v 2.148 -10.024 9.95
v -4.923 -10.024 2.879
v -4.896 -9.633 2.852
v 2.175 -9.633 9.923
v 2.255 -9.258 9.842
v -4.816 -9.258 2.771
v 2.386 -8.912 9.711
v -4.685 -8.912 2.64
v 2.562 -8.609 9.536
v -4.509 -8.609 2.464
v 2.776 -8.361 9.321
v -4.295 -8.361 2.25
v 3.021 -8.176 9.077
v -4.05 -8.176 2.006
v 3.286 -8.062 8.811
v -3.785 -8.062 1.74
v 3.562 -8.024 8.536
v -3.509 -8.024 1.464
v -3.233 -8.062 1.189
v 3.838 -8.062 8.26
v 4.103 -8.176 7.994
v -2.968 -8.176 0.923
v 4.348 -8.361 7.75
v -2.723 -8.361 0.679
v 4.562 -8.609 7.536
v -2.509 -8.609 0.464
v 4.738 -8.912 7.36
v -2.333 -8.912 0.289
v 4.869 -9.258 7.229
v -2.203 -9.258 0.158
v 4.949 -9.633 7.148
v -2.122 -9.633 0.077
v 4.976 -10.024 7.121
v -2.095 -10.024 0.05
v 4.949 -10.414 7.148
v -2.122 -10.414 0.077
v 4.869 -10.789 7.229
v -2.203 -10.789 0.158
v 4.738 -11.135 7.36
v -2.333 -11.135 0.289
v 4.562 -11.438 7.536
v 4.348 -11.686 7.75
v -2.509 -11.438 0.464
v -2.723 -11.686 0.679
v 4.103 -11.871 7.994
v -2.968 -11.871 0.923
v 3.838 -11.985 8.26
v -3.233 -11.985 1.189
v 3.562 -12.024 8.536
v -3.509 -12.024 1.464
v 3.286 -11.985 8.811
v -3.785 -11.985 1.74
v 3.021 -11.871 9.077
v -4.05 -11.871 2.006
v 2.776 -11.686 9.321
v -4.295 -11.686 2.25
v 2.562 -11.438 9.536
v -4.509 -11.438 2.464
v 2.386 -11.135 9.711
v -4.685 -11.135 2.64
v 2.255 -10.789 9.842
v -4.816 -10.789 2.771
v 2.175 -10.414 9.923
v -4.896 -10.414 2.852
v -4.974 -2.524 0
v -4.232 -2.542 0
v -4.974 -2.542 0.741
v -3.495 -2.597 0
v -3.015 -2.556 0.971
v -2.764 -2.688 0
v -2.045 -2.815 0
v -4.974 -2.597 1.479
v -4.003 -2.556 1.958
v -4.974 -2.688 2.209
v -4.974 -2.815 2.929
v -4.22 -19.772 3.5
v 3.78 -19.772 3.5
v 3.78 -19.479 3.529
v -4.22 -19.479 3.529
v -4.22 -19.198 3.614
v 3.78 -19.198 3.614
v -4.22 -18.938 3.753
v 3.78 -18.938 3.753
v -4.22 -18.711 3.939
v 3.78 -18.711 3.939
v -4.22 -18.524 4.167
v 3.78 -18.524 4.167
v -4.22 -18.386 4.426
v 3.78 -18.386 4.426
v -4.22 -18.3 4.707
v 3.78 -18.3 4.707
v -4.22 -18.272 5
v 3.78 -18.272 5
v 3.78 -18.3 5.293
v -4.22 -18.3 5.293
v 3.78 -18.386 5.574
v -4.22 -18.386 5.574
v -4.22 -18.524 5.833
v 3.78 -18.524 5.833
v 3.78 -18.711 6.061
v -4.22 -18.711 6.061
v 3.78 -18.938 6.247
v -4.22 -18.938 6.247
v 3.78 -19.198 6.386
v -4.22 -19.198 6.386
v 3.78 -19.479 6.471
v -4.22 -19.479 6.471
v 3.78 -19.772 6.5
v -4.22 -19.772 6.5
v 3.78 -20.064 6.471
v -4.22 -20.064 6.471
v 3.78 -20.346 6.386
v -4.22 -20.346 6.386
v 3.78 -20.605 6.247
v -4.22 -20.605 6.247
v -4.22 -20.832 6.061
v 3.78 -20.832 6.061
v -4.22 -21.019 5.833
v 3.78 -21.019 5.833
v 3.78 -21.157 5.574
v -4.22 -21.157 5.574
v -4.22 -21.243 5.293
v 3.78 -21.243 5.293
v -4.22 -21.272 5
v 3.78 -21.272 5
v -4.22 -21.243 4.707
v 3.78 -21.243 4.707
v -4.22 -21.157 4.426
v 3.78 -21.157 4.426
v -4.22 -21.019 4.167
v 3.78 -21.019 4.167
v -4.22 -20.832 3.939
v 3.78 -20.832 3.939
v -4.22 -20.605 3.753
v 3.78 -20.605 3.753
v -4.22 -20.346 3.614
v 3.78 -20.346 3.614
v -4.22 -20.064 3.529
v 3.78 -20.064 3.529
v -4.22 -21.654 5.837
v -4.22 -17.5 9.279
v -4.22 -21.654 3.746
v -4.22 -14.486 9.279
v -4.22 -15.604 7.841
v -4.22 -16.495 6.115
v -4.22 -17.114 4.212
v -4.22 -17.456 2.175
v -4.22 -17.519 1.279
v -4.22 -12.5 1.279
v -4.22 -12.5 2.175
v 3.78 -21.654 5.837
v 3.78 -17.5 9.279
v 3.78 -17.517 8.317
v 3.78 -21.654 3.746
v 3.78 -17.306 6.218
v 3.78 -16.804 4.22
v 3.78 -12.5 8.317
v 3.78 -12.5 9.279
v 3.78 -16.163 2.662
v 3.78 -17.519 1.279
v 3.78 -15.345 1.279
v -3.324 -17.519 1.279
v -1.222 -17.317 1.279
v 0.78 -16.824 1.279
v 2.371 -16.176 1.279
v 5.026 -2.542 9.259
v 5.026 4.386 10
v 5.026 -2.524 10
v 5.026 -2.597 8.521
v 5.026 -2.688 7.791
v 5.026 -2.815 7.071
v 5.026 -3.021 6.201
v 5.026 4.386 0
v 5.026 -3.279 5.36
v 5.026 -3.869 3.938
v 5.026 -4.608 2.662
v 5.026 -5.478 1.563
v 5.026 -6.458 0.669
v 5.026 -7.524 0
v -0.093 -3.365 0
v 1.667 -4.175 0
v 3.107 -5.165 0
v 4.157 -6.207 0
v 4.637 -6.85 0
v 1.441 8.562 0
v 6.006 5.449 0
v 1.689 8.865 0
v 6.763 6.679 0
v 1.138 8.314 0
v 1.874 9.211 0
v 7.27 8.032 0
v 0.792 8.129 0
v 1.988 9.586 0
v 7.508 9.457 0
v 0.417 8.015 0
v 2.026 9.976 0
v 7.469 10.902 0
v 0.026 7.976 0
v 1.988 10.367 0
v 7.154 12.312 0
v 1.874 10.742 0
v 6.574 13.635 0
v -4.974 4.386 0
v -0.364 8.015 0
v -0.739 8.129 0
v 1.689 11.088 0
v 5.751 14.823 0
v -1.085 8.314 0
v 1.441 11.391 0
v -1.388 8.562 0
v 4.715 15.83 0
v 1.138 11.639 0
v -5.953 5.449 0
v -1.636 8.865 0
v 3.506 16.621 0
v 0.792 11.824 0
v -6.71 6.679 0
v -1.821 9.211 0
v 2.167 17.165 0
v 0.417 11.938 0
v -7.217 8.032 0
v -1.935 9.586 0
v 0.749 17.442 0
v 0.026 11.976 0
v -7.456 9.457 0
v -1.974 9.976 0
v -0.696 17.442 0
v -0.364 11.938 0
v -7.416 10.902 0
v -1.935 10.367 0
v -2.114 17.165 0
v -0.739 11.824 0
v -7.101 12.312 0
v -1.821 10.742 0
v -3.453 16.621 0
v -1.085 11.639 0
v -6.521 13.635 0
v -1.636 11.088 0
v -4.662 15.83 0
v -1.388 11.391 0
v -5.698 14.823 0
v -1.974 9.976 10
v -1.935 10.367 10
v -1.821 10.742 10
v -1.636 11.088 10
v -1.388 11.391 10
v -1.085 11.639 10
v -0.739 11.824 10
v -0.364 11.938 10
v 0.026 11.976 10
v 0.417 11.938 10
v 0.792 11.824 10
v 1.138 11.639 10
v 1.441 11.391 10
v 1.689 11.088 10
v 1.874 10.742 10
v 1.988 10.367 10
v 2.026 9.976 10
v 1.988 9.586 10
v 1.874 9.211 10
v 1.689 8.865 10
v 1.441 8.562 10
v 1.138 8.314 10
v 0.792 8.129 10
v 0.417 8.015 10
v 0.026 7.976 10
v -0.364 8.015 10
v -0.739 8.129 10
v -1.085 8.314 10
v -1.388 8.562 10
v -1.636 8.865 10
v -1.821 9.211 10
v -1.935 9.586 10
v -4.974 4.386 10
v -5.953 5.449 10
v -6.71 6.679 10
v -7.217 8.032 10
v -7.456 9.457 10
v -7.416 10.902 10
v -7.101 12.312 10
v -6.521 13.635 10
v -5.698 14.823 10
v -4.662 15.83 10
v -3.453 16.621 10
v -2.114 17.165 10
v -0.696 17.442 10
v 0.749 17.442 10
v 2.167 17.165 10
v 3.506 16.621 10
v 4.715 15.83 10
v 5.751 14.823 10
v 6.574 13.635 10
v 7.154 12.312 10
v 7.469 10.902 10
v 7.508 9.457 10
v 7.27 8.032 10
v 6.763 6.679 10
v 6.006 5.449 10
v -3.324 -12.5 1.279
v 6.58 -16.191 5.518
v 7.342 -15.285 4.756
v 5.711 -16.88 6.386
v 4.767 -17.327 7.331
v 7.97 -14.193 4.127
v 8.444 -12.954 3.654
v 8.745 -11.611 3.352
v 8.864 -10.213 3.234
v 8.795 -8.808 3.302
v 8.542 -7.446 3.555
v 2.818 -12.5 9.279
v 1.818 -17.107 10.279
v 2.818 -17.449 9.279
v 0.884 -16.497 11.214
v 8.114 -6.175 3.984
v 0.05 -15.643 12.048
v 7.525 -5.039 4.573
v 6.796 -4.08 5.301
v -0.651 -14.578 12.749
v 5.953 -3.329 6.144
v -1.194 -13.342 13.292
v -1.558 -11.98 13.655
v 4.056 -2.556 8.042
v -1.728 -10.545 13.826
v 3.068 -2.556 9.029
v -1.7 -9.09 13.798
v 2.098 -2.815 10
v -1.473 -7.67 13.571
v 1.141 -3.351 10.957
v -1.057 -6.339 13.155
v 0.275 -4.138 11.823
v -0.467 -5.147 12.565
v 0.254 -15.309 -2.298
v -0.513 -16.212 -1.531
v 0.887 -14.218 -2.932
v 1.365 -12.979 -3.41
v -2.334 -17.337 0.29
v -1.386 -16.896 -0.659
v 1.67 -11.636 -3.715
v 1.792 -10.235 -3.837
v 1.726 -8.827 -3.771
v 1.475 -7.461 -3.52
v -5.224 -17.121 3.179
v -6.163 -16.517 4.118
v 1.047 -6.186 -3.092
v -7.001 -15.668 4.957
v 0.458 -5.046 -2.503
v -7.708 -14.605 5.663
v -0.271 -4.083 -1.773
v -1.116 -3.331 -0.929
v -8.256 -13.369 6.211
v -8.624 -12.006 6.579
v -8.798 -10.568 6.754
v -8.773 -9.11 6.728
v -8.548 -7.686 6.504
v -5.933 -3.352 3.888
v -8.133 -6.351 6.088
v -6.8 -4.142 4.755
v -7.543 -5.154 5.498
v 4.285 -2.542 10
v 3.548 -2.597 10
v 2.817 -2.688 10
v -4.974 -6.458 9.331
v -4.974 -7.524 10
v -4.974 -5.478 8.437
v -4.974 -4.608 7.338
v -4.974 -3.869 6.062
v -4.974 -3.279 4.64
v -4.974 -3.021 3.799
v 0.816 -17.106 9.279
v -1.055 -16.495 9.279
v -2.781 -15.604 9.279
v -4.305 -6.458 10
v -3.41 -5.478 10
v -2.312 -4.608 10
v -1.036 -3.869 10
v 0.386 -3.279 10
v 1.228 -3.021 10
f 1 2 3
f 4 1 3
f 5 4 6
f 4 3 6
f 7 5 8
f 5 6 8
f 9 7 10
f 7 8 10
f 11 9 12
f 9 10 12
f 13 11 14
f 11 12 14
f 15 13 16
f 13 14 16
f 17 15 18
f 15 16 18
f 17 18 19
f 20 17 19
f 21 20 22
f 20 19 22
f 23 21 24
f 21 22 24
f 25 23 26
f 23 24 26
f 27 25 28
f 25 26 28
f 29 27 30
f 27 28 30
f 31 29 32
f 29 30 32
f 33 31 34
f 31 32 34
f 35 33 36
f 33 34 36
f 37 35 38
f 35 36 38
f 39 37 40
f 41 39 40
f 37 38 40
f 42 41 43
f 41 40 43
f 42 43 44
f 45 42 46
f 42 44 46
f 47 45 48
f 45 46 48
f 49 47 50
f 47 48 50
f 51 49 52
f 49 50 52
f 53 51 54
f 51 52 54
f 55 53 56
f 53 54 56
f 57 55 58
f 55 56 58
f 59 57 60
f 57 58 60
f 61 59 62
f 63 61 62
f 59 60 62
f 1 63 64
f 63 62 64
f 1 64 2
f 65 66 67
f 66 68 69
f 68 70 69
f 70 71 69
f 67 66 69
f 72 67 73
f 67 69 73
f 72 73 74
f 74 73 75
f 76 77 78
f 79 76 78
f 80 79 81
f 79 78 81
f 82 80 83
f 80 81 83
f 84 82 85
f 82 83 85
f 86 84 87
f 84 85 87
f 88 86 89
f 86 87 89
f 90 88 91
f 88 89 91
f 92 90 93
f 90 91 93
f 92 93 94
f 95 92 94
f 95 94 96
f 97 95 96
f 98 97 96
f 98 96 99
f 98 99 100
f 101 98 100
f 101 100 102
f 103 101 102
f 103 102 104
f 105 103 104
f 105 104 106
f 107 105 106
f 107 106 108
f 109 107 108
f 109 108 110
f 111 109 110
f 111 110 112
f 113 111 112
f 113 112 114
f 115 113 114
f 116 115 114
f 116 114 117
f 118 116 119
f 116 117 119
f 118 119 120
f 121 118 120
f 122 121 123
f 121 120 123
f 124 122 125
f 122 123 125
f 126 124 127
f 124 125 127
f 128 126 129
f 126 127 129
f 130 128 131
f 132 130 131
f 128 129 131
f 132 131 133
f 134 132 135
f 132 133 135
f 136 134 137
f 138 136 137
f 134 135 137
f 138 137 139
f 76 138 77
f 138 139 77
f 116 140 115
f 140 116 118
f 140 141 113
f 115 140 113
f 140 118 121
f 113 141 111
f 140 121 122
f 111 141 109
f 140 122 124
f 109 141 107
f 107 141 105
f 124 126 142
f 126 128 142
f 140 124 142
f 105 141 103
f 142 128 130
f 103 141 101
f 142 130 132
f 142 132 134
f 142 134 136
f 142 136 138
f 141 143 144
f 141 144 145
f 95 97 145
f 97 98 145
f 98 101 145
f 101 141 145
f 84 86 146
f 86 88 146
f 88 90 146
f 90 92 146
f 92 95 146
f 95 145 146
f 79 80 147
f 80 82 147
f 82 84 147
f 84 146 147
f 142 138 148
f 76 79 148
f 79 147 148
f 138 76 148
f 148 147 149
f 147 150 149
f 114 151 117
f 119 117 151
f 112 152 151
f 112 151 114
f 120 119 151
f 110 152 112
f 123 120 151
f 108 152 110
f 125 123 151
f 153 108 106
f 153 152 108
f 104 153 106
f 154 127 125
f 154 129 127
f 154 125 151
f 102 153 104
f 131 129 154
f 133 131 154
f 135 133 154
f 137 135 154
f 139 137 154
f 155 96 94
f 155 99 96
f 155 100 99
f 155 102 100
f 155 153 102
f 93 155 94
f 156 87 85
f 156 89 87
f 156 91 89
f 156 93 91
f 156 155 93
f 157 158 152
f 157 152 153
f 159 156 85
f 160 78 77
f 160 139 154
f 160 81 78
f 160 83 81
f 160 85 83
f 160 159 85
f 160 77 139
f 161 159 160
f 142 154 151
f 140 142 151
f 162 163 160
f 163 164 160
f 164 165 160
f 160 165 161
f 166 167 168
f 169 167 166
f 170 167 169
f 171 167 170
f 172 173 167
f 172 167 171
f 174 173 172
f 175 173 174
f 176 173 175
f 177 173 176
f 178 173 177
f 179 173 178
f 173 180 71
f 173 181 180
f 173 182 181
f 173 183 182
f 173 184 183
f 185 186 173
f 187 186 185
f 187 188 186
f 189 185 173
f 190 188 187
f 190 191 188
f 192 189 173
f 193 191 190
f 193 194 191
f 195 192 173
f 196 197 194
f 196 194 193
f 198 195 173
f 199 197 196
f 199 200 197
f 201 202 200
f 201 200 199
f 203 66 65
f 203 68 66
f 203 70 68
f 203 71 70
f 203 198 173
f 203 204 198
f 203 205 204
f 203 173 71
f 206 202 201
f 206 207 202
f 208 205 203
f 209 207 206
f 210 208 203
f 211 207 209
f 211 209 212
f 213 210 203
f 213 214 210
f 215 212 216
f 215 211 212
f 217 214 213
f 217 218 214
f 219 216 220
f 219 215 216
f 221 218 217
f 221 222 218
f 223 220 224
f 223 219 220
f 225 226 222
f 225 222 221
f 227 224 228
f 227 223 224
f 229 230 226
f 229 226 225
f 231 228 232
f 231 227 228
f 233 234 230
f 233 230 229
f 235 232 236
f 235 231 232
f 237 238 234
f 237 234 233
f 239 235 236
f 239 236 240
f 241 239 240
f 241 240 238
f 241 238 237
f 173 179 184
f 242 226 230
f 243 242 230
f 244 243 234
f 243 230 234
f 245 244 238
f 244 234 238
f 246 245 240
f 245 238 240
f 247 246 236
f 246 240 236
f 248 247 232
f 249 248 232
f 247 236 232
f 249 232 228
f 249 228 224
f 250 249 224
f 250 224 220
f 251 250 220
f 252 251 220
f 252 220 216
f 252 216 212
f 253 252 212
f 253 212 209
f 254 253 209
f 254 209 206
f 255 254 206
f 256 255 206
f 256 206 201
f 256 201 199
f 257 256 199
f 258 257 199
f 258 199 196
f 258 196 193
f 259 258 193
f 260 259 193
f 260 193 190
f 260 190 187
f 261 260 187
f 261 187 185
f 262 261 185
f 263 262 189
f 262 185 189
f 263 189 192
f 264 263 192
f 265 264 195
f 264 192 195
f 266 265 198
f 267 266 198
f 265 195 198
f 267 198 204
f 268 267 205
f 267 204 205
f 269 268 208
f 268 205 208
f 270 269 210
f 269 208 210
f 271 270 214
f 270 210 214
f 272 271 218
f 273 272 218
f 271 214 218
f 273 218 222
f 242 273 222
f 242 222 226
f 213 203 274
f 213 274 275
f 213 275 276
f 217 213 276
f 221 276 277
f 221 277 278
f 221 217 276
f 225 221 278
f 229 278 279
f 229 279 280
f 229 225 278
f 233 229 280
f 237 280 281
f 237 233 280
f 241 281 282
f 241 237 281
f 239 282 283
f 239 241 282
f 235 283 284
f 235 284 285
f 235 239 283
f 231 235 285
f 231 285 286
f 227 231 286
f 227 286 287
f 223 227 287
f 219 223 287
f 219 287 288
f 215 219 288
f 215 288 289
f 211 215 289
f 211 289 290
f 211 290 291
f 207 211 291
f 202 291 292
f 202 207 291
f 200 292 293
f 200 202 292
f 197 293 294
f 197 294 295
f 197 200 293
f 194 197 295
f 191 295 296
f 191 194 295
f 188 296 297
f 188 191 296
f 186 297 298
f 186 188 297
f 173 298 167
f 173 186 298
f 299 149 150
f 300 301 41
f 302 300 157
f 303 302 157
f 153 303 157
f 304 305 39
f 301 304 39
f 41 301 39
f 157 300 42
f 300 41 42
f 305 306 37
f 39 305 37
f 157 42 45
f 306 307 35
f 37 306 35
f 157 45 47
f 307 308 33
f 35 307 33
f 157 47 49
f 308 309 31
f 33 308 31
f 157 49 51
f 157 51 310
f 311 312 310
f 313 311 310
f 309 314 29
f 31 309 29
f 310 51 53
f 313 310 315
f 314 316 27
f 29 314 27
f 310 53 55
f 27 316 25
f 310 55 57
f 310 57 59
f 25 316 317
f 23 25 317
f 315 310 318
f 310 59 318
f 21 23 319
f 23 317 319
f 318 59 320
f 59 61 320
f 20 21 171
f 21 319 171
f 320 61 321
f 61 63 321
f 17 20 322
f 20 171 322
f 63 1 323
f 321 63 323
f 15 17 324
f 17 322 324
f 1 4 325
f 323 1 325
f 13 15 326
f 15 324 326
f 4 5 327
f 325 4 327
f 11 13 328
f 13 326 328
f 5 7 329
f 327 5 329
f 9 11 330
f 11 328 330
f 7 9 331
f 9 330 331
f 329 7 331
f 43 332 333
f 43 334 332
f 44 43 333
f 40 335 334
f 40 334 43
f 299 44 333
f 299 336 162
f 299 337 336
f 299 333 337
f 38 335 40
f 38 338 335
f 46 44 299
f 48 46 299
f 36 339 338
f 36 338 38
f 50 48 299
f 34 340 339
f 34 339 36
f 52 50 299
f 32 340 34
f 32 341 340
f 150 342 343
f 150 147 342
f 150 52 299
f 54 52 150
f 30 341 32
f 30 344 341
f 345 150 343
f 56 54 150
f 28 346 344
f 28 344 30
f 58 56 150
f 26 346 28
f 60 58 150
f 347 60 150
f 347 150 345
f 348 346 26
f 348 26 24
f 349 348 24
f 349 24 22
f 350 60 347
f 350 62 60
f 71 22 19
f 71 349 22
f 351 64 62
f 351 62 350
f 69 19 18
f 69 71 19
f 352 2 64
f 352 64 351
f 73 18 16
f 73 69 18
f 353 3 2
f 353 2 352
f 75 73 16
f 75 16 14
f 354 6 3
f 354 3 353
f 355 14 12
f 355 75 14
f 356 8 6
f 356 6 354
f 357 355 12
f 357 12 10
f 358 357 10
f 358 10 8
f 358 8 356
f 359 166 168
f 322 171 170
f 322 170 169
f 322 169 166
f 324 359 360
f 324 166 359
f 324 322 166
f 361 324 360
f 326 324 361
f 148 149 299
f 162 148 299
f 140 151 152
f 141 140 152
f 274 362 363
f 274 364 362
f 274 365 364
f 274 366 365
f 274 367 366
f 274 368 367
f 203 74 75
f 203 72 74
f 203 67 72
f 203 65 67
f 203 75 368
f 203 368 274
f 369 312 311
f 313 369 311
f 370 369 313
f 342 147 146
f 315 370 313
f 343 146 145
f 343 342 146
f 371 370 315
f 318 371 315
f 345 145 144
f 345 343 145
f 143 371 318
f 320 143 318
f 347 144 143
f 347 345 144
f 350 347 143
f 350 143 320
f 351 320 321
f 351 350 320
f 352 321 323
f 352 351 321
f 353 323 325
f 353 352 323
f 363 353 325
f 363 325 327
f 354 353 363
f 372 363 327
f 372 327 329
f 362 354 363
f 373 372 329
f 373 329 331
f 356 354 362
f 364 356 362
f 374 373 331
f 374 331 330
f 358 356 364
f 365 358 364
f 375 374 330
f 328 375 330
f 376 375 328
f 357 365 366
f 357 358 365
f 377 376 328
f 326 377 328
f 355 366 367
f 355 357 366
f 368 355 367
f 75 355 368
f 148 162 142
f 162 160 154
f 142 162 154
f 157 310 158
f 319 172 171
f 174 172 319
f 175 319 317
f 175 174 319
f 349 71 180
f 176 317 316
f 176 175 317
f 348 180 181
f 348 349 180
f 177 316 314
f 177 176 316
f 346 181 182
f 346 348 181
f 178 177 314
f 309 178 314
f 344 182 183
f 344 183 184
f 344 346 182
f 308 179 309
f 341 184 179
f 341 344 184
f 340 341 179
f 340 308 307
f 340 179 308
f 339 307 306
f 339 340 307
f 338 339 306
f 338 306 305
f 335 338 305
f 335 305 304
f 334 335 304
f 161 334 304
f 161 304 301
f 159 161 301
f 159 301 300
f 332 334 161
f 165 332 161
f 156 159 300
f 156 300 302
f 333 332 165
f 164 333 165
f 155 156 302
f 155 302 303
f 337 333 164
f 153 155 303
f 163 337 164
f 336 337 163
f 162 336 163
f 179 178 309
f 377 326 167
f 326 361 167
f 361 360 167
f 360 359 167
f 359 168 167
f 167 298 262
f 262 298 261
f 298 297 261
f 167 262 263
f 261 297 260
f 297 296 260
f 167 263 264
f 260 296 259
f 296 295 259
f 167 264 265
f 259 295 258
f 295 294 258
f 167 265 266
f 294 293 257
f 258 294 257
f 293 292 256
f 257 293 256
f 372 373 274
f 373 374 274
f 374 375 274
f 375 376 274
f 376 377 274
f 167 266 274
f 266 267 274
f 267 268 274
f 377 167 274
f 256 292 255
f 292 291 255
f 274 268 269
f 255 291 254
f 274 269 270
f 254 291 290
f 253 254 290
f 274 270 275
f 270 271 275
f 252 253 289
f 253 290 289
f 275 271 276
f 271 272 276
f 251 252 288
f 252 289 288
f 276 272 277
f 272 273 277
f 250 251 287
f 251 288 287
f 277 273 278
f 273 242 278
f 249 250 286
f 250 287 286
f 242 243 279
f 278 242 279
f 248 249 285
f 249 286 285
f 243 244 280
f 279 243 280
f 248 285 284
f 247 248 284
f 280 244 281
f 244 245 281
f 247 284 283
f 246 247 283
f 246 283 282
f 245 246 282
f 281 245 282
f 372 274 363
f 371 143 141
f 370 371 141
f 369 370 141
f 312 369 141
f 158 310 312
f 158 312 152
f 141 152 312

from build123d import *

# Parameters (mm, degrees)
SKETCH1_R               = 1.5
BOSS_EXTRUDE1_DEPTH     = 10
SKETCH2_R               = 2
CUT_EXTRUDE1_DEPTH      = 30
SKETCH6_R               = 7.5
BOSS_EXTRUDE3_DEPTH     = 5
CUT_EXTRUDE4_DEPTH      = 26.013853674
CUT_EXTRUDE4_DEPTH_BACK = 26.013853674
SKETCH7_R               = 1.5
SKETCH8_R               = 2
CUT_EXTRUDE5_DEPTH      = 18
SKETCH10_R              = 7.5
CUT_EXTRUDE7_DEPTH      = 9
SKETCH11_W              = 8
SKETCH11_H              = 8
BOSS_EXTRUDE4_DEPTH     = 5
SKETCH13_R              = 1.5
CUT_EXTRUDE8_DEPTH      = 10


with BuildPart() as part:
    # Sketch1 → Boss-Extrude1 (new body)
    with BuildSketch(Plane.XY):
        with BuildLine():
            Line((5.026455026, -10.023549892), (-4.973544974, -10.023549892))
            Line((-4.973544974, -10.023549892), (-4.973544974, 4.386280164))
            ThreePointArc((-4.973544974, 4.386280164), (0.026455026, 17.476450108), (5.026455026, 4.386280164))
            Line((5.026455026, 4.386280164), (5.026455026, -10.023549892))
        make_face()
        with Locations((0.026455026, 9.976450108)):
            Circle(SKETCH1_R, mode=Mode.SUBTRACT)
    extrude(amount=BOSS_EXTRUDE1_DEPTH)

    # Sketch2 → Cut-Extrude1 (cut)
    with BuildSketch(Plane(origin=(0, 0, 0), x_dir=(-1, 0, 0), z_dir=(0, 0, -1))):
        with Locations((-0.026455026, 9.976450108)):
            Circle(SKETCH2_R)
    extrude(amount=-CUT_EXTRUDE1_DEPTH, mode=Mode.SUBTRACT)

    # Sketch6 → Boss-Extrude3 (add, symmetric)
    with BuildSketch(Plane(origin=(2.513227513, 0, 2.513227513), x_dir=(-0.7071067811865477, 0, 0.7071067811865475), z_dir=(-0.7071067811865475, 0, -0.7071067811865477))):
        with Locations((3.516827377, -10.023549892)):
            Circle(SKETCH6_R)
    extrude(amount=BOSS_EXTRUDE3_DEPTH, both=True)

    # Sketch7 → Cut-Extrude4 (cut, two sides: drawn at the far end of the back side and taken through both)
    with BuildSketch(Plane(origin=(-1.022306393, 0, -1.022306393), x_dir=(-0.7071067811865476, 0, 0.7071067811865476), z_dir=(-0.7071067811865476, 0, -0.7071067811865476)).offset(-CUT_EXTRUDE4_DEPTH_BACK)):
        with Locations((3.516827377, -10.023549892)):
            Circle(SKETCH7_R)
    extrude(amount=CUT_EXTRUDE4_DEPTH + CUT_EXTRUDE4_DEPTH_BACK, mode=Mode.SUBTRACT)

    # Sketch8 → Cut-Extrude5 (cut, symmetric)
    with BuildSketch(Plane(origin=(-1.022306393, 0, -1.022306393), x_dir=(-0.7071067811865476, 0, 0.7071067811865476), z_dir=(-0.7071067811865476, 0, -0.7071067811865476))):
        with Locations((3.516827377, -10.023549892)):
            Circle(SKETCH8_R)
    extrude(amount=CUT_EXTRUDE5_DEPTH, both=True, mode=Mode.SUBTRACT)

    # Sketch10 → Cut-Extrude7 (cut)
    with BuildSketch(Plane(origin=(6.048761419, 0, 6.048761419), x_dir=(0.7071067811865476, 0, -0.7071067811865476), z_dir=(0.7071067811865476, 0, 0.7071067811865476))):
        with Locations((-3.516827377, -10.023549892)):
            Circle(SKETCH10_R)
    cut_extrude7 = extrude(amount=CUT_EXTRUDE7_DEPTH, mode=Mode.SUBTRACT)

    # Mirror1: Cut-Extrude7 across plane
    add(cut_extrude7.mirror(Plane(origin=(2.513227513, 0, 2.513227513), x_dir=(-0.7071067811865478, 0, 0.7071067811865472), z_dir=(-0.7071067811865475, 0, -0.7071067811865477))), mode=Mode.SUBTRACT)

    # Sketch11 → Boss-Extrude4 (add, symmetric)
    with BuildSketch(Plane(origin=(0, -17.5, 0), x_dir=(1, 0, 0), z_dir=(0, 1, 0))):
        with Locations((-0.219742317, -5.27916127)):
            Rectangle(SKETCH11_W, SKETCH11_H)
    extrude(amount=BOSS_EXTRUDE4_DEPTH, both=True)

    # Sketch13 → Cut-Extrude8 (cut)
    with BuildSketch(Plane(origin=(3.780257683, 0, 0), x_dir=(0, 0, -1), z_dir=(1, 0, 0))):
        with Locations((-5, -19.771629817)):
            Circle(SKETCH13_R)
        Polygon((-5.836861044, -21.653637688), (-9.27916127, -17.5), (-9.27916127, -22.5), (-1.27916127, -22.5), (-1.27916127, -17.51897011), (-3.745741187, -21.653637688), align=None)
    extrude(amount=-CUT_EXTRUDE8_DEPTH, mode=Mode.SUBTRACT)


solid = part.part
